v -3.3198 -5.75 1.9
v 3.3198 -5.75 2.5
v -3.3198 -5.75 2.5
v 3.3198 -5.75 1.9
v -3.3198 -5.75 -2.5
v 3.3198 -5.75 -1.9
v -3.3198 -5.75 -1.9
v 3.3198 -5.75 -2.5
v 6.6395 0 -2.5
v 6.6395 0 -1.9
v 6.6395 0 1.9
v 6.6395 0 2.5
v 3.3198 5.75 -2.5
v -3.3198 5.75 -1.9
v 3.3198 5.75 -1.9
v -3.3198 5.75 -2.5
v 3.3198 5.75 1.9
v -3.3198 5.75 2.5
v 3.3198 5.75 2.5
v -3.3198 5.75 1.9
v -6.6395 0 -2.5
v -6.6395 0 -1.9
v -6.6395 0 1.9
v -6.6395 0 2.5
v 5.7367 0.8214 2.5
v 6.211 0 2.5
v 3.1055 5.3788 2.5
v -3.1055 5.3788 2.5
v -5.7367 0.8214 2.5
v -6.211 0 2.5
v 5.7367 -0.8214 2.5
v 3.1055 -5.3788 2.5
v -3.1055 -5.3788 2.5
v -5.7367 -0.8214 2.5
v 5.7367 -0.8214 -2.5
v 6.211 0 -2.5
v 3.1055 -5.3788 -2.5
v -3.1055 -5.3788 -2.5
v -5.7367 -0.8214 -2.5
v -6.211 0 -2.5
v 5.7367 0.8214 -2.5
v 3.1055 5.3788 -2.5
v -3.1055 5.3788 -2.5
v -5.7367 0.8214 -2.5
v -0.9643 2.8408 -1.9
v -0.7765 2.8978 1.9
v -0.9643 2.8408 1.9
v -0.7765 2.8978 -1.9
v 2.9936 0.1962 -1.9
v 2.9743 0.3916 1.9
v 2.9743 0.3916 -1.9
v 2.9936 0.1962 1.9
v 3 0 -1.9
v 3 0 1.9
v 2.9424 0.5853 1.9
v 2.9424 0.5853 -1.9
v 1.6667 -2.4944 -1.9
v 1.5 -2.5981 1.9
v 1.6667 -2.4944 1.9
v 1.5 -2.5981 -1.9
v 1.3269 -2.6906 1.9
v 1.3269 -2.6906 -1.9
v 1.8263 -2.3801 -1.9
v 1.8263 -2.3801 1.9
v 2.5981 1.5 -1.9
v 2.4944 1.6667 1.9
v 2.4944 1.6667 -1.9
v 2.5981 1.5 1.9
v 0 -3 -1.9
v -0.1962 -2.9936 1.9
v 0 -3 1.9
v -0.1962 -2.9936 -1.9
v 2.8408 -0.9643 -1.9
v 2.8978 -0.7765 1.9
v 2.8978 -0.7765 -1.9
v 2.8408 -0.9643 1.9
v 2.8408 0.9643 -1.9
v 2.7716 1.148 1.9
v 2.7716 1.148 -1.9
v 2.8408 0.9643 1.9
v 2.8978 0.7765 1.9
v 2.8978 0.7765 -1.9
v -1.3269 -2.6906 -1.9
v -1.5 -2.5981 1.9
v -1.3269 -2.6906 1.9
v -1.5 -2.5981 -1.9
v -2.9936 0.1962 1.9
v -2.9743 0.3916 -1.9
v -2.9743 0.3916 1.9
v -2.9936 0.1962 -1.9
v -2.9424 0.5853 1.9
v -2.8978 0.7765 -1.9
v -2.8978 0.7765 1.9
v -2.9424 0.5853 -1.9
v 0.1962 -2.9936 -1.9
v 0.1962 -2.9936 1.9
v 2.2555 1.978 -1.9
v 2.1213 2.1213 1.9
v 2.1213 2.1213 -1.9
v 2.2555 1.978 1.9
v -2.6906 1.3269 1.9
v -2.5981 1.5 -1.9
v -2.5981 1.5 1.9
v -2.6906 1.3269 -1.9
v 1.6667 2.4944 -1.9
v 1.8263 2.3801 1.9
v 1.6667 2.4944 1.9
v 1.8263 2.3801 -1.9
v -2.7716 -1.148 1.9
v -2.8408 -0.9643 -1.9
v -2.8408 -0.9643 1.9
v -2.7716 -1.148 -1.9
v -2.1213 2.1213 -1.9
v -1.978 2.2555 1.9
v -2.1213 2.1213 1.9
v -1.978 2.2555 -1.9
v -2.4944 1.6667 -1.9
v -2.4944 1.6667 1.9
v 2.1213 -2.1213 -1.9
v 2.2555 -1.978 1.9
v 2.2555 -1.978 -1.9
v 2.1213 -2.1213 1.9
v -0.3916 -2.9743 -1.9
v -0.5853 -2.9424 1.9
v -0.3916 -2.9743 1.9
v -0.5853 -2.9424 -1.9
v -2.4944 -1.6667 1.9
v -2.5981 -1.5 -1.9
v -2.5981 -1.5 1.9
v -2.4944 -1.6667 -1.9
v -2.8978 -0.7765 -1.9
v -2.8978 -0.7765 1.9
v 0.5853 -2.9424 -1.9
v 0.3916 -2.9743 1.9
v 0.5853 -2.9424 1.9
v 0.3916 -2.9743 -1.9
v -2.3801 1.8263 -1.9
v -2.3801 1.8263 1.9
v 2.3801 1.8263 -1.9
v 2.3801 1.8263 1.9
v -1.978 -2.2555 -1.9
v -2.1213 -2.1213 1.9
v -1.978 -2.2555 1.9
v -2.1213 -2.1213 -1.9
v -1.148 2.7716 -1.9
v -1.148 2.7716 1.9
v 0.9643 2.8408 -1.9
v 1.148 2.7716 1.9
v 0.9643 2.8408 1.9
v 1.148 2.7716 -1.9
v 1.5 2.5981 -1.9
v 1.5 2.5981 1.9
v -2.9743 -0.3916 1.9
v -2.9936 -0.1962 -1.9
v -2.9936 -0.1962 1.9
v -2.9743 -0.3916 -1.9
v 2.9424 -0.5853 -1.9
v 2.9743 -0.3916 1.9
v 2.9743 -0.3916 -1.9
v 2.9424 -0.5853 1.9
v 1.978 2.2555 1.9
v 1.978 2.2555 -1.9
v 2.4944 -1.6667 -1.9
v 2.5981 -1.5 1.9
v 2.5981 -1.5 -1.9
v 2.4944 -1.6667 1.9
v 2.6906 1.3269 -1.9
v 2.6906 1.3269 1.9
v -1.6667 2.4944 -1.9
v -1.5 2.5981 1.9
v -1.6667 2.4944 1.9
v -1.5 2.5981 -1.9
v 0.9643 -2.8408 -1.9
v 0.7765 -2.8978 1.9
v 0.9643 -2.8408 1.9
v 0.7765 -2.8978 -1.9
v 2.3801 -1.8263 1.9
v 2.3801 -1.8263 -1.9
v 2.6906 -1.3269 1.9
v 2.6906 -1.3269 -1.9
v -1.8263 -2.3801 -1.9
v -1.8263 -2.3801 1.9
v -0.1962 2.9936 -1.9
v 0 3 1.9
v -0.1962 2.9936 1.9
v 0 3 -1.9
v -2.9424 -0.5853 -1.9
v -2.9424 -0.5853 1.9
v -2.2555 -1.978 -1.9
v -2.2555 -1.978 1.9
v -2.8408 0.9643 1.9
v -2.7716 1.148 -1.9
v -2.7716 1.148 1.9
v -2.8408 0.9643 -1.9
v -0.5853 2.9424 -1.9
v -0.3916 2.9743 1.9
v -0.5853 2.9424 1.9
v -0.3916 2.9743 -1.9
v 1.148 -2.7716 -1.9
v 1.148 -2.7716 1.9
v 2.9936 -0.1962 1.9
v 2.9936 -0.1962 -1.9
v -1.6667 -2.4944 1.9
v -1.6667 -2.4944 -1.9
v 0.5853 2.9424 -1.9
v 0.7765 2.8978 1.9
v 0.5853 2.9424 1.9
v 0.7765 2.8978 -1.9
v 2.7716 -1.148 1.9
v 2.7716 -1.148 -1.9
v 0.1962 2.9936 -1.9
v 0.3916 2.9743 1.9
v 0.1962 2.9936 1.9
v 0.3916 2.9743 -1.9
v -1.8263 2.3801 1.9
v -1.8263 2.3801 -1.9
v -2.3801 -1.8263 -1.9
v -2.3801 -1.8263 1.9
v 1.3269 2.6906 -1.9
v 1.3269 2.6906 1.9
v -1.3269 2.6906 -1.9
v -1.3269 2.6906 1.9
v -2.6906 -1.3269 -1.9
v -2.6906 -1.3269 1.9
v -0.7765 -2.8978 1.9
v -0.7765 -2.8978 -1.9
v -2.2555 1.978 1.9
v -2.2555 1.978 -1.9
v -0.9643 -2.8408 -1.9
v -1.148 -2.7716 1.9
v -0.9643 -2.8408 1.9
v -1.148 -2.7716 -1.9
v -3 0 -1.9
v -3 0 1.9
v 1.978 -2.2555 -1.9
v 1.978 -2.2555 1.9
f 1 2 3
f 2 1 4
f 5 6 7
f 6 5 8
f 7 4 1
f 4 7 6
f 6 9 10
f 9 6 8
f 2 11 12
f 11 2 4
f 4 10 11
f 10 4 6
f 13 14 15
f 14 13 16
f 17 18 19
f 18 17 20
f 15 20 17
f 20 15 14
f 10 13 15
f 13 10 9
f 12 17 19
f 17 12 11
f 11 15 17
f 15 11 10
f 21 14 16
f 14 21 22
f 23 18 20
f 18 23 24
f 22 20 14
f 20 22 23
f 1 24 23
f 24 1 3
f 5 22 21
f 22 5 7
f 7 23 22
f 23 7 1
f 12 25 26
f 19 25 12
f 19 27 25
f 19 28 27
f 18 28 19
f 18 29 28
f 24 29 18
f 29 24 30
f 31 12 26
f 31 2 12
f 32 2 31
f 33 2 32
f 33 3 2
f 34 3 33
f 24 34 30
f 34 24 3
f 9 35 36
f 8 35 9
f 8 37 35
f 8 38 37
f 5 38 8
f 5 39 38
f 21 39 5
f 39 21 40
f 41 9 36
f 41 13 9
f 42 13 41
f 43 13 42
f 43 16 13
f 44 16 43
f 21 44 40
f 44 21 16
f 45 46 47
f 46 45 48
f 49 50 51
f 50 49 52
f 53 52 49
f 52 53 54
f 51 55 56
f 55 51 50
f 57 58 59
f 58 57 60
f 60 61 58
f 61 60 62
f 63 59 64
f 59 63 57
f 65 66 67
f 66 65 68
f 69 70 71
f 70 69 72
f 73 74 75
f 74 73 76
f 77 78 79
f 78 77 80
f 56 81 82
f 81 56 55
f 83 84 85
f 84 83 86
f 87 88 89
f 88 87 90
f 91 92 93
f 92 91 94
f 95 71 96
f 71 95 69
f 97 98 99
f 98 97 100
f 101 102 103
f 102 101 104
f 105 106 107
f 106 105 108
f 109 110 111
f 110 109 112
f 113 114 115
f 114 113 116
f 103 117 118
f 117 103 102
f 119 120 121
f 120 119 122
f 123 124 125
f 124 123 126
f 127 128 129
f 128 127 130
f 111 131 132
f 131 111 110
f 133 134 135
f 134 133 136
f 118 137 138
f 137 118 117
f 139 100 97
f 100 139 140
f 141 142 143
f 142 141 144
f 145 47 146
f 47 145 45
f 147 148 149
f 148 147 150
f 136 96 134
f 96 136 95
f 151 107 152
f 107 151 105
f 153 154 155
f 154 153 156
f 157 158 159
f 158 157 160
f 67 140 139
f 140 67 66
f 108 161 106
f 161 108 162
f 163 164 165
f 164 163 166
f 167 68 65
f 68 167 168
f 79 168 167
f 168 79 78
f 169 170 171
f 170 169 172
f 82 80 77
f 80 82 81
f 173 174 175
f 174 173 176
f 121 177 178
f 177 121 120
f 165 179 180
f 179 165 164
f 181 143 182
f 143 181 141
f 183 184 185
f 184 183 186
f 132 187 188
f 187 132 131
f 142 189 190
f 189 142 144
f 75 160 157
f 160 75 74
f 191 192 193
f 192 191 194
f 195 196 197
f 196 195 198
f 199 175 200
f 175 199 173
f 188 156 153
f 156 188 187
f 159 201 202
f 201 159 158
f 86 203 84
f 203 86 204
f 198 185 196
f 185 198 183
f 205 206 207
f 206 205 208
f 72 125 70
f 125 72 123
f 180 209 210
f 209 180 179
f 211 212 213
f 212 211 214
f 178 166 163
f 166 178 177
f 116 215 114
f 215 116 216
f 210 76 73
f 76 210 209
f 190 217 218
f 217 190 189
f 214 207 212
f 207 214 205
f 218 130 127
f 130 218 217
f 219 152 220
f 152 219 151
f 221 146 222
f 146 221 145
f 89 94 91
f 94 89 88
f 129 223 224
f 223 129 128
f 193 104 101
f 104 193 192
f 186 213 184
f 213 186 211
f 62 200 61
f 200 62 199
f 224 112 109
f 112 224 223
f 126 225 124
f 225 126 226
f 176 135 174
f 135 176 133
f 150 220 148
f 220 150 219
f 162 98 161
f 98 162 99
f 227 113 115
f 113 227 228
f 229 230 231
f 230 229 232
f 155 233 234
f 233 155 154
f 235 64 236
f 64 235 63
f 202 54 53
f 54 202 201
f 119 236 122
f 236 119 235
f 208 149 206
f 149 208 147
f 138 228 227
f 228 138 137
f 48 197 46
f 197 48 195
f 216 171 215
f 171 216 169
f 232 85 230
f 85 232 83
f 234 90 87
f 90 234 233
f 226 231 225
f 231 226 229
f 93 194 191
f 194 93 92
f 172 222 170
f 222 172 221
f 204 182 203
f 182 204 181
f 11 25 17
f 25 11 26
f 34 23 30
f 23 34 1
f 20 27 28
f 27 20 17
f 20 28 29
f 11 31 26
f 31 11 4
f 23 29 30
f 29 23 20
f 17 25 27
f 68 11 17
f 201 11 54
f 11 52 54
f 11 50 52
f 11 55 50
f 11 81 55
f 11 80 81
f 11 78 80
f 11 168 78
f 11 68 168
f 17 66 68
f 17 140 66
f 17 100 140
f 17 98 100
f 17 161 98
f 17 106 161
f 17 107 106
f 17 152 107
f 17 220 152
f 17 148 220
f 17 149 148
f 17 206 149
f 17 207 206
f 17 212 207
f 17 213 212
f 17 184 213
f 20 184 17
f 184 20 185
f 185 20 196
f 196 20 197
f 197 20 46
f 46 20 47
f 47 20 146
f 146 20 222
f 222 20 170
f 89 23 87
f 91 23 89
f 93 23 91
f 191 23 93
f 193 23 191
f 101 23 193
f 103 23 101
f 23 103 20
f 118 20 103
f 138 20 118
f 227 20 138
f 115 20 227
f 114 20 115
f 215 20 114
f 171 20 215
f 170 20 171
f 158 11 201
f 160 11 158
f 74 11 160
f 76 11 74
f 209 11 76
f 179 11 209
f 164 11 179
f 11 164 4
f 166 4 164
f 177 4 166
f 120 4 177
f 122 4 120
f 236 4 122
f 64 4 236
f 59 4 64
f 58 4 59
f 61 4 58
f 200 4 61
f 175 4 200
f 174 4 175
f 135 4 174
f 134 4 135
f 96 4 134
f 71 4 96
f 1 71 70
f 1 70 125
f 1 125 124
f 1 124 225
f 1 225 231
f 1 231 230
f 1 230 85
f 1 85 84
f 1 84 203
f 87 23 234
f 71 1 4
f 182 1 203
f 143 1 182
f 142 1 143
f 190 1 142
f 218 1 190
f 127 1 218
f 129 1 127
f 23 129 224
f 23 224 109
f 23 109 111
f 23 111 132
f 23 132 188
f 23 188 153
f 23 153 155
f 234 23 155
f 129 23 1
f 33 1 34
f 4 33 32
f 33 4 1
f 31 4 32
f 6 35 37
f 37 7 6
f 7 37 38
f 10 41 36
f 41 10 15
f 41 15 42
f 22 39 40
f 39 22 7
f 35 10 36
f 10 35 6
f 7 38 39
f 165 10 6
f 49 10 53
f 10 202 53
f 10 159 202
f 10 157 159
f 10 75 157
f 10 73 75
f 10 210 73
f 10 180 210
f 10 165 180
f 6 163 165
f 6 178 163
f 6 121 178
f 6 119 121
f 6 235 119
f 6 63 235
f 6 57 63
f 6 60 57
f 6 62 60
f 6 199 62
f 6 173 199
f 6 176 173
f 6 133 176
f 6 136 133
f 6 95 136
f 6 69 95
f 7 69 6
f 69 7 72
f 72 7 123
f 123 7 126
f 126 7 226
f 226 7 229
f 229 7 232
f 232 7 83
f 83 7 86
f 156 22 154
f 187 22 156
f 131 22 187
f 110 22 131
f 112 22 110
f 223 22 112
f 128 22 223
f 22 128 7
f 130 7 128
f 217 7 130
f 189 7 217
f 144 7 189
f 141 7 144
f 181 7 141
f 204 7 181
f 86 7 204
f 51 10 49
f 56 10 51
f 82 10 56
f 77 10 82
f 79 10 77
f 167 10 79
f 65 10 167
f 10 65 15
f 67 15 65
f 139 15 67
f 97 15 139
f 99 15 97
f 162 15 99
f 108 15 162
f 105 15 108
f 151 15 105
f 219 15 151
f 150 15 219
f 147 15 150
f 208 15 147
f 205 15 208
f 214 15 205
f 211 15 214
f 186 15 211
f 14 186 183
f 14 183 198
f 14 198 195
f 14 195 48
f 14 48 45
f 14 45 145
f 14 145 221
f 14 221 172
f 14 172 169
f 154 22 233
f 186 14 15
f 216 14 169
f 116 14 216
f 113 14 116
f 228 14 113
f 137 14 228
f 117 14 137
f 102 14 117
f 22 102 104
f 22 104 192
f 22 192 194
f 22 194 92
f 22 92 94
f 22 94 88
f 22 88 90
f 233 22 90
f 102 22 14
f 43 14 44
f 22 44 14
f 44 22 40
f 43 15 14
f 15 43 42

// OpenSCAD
// Hex nut for 6.0mm screws
// 11.5mm across flats, 5.0mm thick

thread_nominal_diameter_mm = 6;          // M6 nominal
across_flats_mm = 11.5;                  // AF
thickness_mm = 5.0;                      // nut thickness
hole_type_is_threaded = 1;               // 1=threaded (modeled as simple hole), 0=clearance
thread_hole_diameter_mm = 6.0;           // simple representation of thread minor/nominal
clearance_hole_diameter_mm = 6.6;        // typical clearance
chamfer_mm = 0.5;                        // edge chamfer
eps_mm = 0.2;

$fn = 96;

// Derived
hex_circumradius_mm = across_flats_mm / (2 * cos(30)); // converts AF to circumscribed radius
hole_diameter_mm = hole_type_is_threaded ? thread_hole_diameter_mm : clearance_hole_diameter_mm;

module hex_nut(af=across_flats_mm, t=thickness_mm, d=hole_diameter_mm, cham=chamfer_mm) {
    R = af / (2 * cos(30));
    difference() {
        // Outer hex body (true hex across flats)
        cylinder(r=R, h=t, center=true, $fn=6);

        // Through hole
        cylinder(d=d, h=t + 2*eps_mm, center=true, $fn=96);

        // Top chamfer (remove material)
        if (cham > 0)
            translate([0, 0,  t/2 - cham/2])
                cylinder(r1=R, r2=R - cham, h=cham + eps_mm, center=true, $fn=6);

        // Bottom chamfer (remove material)
        if (cham > 0)
            translate([0, 0, -t/2 + cham/2])
                cylinder(r1=R - cham, r2=R, h=cham + eps_mm, center=true, $fn=6);
    }
}

hex_nut();
